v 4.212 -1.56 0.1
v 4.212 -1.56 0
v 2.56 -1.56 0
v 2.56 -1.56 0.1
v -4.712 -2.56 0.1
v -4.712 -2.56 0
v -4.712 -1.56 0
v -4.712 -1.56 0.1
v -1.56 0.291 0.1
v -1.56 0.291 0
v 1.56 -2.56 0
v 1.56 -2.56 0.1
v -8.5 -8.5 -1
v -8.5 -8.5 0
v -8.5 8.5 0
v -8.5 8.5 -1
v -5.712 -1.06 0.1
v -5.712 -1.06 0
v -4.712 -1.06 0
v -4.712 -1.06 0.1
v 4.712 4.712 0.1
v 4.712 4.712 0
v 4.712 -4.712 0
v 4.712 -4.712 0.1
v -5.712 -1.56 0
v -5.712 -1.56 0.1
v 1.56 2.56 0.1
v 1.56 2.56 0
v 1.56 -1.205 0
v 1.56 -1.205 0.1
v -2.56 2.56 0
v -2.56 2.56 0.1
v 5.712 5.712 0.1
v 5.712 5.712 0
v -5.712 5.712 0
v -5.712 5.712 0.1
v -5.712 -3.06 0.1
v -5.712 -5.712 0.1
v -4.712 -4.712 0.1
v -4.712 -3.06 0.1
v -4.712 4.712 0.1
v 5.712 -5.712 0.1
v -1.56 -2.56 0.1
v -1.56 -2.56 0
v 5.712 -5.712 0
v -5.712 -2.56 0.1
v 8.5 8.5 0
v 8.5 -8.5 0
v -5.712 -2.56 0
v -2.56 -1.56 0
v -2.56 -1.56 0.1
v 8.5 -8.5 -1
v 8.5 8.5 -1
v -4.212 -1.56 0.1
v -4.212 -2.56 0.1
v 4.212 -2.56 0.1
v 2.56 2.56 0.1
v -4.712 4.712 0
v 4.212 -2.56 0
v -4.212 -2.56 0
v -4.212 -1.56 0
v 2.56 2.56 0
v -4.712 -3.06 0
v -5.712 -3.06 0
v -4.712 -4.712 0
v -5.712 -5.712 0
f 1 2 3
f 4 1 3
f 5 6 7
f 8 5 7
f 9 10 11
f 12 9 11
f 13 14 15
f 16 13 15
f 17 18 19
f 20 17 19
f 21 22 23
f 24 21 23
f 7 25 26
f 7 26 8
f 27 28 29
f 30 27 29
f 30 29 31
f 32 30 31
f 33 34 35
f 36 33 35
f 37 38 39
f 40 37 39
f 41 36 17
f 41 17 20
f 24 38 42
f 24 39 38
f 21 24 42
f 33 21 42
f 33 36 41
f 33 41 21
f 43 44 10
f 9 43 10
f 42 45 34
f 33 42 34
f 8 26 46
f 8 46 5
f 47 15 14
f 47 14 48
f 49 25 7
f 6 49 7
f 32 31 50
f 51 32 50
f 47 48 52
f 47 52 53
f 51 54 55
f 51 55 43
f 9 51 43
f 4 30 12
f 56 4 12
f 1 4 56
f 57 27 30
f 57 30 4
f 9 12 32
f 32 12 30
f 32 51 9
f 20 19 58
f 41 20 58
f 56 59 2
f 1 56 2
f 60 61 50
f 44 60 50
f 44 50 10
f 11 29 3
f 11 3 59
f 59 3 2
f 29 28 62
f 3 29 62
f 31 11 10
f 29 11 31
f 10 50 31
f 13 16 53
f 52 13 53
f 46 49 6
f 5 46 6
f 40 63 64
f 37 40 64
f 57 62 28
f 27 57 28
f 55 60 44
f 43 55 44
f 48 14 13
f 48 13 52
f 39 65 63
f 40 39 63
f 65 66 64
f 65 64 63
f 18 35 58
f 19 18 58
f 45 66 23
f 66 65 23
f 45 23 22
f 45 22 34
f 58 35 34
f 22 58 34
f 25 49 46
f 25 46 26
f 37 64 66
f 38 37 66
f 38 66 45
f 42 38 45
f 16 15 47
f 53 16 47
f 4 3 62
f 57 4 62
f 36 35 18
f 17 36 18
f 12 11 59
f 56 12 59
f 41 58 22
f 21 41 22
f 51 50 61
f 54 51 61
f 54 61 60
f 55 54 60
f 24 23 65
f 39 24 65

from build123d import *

# Parameters (mm, degrees)
F1_DEPTH = 0.1
F0_W     = 1
F0_H     = 1
F2_W     = 17
F2_H     = 17
F3_DEPTH = 1


with BuildPart() as f1:
    # F0 (on Top) → F1 (new body)
    with BuildSketch(Plane.XY):
        Polygon((5.712, 5.712), (-5.712, 5.712), (-5.712, -1.06), (-4.712, -1.06), (-4.712, 4.712), (4.712, 4.712), (4.712, -4.712), (-4.712, -4.712), (-4.712, -3.06), (-5.712, -3.06), (-5.712, -5.712), (5.712, -5.712), align=None)
    extrude(amount=F1_DEPTH)


with BuildPart() as f1b:
    # F0 (on Top) → F1, piece 2 (new body)
    with BuildSketch(Plane.XY):
        with Locations((-5.212, -2.06)):
            Rectangle(F0_W, F0_H)
    extrude(amount=F1_DEPTH)


with BuildPart() as f1c:
    # F0 (on Top) → F1, piece 3 (new body)
    with BuildSketch(Plane.XY):
        Polygon((-4.212, -1.56), (-4.212, -2.56), (-1.56, -2.56), (-1.56, 0.2913885544), (1.56, -2.56), (4.212, -2.56), (4.212, -1.56), (2.56, -1.56), (2.56, 2.56), (1.56, 2.56), (1.56, -1.2052951423), (-2.56, 2.56), (-2.56, -1.56), align=None)
    extrude(amount=F1_DEPTH)


with BuildPart() as f3:
    # F2 (on Top) → F3 (new body)
    with BuildSketch(Plane.XY):
        Rectangle(F2_W, F2_H)
    extrude(amount=-F3_DEPTH)


solid = Compound([f1.part, f1b.part, f1c.part, f3.part])
